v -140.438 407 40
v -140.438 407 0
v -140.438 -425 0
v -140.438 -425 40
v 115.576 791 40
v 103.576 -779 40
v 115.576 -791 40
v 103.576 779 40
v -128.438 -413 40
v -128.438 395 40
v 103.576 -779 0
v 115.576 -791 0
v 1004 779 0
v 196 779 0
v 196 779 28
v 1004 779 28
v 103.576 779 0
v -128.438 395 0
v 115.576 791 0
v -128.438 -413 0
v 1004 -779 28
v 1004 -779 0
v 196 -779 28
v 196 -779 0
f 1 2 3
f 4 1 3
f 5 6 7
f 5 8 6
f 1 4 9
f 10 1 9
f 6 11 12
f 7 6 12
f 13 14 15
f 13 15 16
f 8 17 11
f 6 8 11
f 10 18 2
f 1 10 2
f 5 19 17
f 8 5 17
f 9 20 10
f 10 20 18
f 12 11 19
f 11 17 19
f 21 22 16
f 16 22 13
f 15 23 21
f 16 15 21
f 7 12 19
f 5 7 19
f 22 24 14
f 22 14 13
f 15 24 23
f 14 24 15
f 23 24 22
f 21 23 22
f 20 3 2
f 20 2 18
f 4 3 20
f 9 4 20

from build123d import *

# Parameters (mm, degrees)
F1_DEPTH = 40
F3_DEPTH = 40
F4_W     = 808
F4_H     = 1558
F5_DEPTH = 28


with BuildPart() as f1:
    # F0 (on Top) → F1 (new body)
    with BuildSketch(Plane.XY):
        Polygon((-140.437798, 407), (-140.437798, -425), (-128.437798, -413), (-128.437798, 395), align=None)
    extrude(amount=F1_DEPTH)


with BuildPart() as f3:
    # F2 (on Top) → F3 (new body)
    with BuildSketch(Plane.XY):
        Polygon((103.575772, -779), (115.575772, -791), (115.575772, 791), (103.575772, 779), align=None)
    extrude(amount=F3_DEPTH)


with BuildPart() as f5:
    # F4 (on Top) → F5 (new body)
    with BuildSketch(Plane.XY):
        with Locations((600, 0)):
            Rectangle(F4_W, F4_H)
    extrude(amount=F5_DEPTH)


solid = Compound([f1.part, f3.part, f5.part])
